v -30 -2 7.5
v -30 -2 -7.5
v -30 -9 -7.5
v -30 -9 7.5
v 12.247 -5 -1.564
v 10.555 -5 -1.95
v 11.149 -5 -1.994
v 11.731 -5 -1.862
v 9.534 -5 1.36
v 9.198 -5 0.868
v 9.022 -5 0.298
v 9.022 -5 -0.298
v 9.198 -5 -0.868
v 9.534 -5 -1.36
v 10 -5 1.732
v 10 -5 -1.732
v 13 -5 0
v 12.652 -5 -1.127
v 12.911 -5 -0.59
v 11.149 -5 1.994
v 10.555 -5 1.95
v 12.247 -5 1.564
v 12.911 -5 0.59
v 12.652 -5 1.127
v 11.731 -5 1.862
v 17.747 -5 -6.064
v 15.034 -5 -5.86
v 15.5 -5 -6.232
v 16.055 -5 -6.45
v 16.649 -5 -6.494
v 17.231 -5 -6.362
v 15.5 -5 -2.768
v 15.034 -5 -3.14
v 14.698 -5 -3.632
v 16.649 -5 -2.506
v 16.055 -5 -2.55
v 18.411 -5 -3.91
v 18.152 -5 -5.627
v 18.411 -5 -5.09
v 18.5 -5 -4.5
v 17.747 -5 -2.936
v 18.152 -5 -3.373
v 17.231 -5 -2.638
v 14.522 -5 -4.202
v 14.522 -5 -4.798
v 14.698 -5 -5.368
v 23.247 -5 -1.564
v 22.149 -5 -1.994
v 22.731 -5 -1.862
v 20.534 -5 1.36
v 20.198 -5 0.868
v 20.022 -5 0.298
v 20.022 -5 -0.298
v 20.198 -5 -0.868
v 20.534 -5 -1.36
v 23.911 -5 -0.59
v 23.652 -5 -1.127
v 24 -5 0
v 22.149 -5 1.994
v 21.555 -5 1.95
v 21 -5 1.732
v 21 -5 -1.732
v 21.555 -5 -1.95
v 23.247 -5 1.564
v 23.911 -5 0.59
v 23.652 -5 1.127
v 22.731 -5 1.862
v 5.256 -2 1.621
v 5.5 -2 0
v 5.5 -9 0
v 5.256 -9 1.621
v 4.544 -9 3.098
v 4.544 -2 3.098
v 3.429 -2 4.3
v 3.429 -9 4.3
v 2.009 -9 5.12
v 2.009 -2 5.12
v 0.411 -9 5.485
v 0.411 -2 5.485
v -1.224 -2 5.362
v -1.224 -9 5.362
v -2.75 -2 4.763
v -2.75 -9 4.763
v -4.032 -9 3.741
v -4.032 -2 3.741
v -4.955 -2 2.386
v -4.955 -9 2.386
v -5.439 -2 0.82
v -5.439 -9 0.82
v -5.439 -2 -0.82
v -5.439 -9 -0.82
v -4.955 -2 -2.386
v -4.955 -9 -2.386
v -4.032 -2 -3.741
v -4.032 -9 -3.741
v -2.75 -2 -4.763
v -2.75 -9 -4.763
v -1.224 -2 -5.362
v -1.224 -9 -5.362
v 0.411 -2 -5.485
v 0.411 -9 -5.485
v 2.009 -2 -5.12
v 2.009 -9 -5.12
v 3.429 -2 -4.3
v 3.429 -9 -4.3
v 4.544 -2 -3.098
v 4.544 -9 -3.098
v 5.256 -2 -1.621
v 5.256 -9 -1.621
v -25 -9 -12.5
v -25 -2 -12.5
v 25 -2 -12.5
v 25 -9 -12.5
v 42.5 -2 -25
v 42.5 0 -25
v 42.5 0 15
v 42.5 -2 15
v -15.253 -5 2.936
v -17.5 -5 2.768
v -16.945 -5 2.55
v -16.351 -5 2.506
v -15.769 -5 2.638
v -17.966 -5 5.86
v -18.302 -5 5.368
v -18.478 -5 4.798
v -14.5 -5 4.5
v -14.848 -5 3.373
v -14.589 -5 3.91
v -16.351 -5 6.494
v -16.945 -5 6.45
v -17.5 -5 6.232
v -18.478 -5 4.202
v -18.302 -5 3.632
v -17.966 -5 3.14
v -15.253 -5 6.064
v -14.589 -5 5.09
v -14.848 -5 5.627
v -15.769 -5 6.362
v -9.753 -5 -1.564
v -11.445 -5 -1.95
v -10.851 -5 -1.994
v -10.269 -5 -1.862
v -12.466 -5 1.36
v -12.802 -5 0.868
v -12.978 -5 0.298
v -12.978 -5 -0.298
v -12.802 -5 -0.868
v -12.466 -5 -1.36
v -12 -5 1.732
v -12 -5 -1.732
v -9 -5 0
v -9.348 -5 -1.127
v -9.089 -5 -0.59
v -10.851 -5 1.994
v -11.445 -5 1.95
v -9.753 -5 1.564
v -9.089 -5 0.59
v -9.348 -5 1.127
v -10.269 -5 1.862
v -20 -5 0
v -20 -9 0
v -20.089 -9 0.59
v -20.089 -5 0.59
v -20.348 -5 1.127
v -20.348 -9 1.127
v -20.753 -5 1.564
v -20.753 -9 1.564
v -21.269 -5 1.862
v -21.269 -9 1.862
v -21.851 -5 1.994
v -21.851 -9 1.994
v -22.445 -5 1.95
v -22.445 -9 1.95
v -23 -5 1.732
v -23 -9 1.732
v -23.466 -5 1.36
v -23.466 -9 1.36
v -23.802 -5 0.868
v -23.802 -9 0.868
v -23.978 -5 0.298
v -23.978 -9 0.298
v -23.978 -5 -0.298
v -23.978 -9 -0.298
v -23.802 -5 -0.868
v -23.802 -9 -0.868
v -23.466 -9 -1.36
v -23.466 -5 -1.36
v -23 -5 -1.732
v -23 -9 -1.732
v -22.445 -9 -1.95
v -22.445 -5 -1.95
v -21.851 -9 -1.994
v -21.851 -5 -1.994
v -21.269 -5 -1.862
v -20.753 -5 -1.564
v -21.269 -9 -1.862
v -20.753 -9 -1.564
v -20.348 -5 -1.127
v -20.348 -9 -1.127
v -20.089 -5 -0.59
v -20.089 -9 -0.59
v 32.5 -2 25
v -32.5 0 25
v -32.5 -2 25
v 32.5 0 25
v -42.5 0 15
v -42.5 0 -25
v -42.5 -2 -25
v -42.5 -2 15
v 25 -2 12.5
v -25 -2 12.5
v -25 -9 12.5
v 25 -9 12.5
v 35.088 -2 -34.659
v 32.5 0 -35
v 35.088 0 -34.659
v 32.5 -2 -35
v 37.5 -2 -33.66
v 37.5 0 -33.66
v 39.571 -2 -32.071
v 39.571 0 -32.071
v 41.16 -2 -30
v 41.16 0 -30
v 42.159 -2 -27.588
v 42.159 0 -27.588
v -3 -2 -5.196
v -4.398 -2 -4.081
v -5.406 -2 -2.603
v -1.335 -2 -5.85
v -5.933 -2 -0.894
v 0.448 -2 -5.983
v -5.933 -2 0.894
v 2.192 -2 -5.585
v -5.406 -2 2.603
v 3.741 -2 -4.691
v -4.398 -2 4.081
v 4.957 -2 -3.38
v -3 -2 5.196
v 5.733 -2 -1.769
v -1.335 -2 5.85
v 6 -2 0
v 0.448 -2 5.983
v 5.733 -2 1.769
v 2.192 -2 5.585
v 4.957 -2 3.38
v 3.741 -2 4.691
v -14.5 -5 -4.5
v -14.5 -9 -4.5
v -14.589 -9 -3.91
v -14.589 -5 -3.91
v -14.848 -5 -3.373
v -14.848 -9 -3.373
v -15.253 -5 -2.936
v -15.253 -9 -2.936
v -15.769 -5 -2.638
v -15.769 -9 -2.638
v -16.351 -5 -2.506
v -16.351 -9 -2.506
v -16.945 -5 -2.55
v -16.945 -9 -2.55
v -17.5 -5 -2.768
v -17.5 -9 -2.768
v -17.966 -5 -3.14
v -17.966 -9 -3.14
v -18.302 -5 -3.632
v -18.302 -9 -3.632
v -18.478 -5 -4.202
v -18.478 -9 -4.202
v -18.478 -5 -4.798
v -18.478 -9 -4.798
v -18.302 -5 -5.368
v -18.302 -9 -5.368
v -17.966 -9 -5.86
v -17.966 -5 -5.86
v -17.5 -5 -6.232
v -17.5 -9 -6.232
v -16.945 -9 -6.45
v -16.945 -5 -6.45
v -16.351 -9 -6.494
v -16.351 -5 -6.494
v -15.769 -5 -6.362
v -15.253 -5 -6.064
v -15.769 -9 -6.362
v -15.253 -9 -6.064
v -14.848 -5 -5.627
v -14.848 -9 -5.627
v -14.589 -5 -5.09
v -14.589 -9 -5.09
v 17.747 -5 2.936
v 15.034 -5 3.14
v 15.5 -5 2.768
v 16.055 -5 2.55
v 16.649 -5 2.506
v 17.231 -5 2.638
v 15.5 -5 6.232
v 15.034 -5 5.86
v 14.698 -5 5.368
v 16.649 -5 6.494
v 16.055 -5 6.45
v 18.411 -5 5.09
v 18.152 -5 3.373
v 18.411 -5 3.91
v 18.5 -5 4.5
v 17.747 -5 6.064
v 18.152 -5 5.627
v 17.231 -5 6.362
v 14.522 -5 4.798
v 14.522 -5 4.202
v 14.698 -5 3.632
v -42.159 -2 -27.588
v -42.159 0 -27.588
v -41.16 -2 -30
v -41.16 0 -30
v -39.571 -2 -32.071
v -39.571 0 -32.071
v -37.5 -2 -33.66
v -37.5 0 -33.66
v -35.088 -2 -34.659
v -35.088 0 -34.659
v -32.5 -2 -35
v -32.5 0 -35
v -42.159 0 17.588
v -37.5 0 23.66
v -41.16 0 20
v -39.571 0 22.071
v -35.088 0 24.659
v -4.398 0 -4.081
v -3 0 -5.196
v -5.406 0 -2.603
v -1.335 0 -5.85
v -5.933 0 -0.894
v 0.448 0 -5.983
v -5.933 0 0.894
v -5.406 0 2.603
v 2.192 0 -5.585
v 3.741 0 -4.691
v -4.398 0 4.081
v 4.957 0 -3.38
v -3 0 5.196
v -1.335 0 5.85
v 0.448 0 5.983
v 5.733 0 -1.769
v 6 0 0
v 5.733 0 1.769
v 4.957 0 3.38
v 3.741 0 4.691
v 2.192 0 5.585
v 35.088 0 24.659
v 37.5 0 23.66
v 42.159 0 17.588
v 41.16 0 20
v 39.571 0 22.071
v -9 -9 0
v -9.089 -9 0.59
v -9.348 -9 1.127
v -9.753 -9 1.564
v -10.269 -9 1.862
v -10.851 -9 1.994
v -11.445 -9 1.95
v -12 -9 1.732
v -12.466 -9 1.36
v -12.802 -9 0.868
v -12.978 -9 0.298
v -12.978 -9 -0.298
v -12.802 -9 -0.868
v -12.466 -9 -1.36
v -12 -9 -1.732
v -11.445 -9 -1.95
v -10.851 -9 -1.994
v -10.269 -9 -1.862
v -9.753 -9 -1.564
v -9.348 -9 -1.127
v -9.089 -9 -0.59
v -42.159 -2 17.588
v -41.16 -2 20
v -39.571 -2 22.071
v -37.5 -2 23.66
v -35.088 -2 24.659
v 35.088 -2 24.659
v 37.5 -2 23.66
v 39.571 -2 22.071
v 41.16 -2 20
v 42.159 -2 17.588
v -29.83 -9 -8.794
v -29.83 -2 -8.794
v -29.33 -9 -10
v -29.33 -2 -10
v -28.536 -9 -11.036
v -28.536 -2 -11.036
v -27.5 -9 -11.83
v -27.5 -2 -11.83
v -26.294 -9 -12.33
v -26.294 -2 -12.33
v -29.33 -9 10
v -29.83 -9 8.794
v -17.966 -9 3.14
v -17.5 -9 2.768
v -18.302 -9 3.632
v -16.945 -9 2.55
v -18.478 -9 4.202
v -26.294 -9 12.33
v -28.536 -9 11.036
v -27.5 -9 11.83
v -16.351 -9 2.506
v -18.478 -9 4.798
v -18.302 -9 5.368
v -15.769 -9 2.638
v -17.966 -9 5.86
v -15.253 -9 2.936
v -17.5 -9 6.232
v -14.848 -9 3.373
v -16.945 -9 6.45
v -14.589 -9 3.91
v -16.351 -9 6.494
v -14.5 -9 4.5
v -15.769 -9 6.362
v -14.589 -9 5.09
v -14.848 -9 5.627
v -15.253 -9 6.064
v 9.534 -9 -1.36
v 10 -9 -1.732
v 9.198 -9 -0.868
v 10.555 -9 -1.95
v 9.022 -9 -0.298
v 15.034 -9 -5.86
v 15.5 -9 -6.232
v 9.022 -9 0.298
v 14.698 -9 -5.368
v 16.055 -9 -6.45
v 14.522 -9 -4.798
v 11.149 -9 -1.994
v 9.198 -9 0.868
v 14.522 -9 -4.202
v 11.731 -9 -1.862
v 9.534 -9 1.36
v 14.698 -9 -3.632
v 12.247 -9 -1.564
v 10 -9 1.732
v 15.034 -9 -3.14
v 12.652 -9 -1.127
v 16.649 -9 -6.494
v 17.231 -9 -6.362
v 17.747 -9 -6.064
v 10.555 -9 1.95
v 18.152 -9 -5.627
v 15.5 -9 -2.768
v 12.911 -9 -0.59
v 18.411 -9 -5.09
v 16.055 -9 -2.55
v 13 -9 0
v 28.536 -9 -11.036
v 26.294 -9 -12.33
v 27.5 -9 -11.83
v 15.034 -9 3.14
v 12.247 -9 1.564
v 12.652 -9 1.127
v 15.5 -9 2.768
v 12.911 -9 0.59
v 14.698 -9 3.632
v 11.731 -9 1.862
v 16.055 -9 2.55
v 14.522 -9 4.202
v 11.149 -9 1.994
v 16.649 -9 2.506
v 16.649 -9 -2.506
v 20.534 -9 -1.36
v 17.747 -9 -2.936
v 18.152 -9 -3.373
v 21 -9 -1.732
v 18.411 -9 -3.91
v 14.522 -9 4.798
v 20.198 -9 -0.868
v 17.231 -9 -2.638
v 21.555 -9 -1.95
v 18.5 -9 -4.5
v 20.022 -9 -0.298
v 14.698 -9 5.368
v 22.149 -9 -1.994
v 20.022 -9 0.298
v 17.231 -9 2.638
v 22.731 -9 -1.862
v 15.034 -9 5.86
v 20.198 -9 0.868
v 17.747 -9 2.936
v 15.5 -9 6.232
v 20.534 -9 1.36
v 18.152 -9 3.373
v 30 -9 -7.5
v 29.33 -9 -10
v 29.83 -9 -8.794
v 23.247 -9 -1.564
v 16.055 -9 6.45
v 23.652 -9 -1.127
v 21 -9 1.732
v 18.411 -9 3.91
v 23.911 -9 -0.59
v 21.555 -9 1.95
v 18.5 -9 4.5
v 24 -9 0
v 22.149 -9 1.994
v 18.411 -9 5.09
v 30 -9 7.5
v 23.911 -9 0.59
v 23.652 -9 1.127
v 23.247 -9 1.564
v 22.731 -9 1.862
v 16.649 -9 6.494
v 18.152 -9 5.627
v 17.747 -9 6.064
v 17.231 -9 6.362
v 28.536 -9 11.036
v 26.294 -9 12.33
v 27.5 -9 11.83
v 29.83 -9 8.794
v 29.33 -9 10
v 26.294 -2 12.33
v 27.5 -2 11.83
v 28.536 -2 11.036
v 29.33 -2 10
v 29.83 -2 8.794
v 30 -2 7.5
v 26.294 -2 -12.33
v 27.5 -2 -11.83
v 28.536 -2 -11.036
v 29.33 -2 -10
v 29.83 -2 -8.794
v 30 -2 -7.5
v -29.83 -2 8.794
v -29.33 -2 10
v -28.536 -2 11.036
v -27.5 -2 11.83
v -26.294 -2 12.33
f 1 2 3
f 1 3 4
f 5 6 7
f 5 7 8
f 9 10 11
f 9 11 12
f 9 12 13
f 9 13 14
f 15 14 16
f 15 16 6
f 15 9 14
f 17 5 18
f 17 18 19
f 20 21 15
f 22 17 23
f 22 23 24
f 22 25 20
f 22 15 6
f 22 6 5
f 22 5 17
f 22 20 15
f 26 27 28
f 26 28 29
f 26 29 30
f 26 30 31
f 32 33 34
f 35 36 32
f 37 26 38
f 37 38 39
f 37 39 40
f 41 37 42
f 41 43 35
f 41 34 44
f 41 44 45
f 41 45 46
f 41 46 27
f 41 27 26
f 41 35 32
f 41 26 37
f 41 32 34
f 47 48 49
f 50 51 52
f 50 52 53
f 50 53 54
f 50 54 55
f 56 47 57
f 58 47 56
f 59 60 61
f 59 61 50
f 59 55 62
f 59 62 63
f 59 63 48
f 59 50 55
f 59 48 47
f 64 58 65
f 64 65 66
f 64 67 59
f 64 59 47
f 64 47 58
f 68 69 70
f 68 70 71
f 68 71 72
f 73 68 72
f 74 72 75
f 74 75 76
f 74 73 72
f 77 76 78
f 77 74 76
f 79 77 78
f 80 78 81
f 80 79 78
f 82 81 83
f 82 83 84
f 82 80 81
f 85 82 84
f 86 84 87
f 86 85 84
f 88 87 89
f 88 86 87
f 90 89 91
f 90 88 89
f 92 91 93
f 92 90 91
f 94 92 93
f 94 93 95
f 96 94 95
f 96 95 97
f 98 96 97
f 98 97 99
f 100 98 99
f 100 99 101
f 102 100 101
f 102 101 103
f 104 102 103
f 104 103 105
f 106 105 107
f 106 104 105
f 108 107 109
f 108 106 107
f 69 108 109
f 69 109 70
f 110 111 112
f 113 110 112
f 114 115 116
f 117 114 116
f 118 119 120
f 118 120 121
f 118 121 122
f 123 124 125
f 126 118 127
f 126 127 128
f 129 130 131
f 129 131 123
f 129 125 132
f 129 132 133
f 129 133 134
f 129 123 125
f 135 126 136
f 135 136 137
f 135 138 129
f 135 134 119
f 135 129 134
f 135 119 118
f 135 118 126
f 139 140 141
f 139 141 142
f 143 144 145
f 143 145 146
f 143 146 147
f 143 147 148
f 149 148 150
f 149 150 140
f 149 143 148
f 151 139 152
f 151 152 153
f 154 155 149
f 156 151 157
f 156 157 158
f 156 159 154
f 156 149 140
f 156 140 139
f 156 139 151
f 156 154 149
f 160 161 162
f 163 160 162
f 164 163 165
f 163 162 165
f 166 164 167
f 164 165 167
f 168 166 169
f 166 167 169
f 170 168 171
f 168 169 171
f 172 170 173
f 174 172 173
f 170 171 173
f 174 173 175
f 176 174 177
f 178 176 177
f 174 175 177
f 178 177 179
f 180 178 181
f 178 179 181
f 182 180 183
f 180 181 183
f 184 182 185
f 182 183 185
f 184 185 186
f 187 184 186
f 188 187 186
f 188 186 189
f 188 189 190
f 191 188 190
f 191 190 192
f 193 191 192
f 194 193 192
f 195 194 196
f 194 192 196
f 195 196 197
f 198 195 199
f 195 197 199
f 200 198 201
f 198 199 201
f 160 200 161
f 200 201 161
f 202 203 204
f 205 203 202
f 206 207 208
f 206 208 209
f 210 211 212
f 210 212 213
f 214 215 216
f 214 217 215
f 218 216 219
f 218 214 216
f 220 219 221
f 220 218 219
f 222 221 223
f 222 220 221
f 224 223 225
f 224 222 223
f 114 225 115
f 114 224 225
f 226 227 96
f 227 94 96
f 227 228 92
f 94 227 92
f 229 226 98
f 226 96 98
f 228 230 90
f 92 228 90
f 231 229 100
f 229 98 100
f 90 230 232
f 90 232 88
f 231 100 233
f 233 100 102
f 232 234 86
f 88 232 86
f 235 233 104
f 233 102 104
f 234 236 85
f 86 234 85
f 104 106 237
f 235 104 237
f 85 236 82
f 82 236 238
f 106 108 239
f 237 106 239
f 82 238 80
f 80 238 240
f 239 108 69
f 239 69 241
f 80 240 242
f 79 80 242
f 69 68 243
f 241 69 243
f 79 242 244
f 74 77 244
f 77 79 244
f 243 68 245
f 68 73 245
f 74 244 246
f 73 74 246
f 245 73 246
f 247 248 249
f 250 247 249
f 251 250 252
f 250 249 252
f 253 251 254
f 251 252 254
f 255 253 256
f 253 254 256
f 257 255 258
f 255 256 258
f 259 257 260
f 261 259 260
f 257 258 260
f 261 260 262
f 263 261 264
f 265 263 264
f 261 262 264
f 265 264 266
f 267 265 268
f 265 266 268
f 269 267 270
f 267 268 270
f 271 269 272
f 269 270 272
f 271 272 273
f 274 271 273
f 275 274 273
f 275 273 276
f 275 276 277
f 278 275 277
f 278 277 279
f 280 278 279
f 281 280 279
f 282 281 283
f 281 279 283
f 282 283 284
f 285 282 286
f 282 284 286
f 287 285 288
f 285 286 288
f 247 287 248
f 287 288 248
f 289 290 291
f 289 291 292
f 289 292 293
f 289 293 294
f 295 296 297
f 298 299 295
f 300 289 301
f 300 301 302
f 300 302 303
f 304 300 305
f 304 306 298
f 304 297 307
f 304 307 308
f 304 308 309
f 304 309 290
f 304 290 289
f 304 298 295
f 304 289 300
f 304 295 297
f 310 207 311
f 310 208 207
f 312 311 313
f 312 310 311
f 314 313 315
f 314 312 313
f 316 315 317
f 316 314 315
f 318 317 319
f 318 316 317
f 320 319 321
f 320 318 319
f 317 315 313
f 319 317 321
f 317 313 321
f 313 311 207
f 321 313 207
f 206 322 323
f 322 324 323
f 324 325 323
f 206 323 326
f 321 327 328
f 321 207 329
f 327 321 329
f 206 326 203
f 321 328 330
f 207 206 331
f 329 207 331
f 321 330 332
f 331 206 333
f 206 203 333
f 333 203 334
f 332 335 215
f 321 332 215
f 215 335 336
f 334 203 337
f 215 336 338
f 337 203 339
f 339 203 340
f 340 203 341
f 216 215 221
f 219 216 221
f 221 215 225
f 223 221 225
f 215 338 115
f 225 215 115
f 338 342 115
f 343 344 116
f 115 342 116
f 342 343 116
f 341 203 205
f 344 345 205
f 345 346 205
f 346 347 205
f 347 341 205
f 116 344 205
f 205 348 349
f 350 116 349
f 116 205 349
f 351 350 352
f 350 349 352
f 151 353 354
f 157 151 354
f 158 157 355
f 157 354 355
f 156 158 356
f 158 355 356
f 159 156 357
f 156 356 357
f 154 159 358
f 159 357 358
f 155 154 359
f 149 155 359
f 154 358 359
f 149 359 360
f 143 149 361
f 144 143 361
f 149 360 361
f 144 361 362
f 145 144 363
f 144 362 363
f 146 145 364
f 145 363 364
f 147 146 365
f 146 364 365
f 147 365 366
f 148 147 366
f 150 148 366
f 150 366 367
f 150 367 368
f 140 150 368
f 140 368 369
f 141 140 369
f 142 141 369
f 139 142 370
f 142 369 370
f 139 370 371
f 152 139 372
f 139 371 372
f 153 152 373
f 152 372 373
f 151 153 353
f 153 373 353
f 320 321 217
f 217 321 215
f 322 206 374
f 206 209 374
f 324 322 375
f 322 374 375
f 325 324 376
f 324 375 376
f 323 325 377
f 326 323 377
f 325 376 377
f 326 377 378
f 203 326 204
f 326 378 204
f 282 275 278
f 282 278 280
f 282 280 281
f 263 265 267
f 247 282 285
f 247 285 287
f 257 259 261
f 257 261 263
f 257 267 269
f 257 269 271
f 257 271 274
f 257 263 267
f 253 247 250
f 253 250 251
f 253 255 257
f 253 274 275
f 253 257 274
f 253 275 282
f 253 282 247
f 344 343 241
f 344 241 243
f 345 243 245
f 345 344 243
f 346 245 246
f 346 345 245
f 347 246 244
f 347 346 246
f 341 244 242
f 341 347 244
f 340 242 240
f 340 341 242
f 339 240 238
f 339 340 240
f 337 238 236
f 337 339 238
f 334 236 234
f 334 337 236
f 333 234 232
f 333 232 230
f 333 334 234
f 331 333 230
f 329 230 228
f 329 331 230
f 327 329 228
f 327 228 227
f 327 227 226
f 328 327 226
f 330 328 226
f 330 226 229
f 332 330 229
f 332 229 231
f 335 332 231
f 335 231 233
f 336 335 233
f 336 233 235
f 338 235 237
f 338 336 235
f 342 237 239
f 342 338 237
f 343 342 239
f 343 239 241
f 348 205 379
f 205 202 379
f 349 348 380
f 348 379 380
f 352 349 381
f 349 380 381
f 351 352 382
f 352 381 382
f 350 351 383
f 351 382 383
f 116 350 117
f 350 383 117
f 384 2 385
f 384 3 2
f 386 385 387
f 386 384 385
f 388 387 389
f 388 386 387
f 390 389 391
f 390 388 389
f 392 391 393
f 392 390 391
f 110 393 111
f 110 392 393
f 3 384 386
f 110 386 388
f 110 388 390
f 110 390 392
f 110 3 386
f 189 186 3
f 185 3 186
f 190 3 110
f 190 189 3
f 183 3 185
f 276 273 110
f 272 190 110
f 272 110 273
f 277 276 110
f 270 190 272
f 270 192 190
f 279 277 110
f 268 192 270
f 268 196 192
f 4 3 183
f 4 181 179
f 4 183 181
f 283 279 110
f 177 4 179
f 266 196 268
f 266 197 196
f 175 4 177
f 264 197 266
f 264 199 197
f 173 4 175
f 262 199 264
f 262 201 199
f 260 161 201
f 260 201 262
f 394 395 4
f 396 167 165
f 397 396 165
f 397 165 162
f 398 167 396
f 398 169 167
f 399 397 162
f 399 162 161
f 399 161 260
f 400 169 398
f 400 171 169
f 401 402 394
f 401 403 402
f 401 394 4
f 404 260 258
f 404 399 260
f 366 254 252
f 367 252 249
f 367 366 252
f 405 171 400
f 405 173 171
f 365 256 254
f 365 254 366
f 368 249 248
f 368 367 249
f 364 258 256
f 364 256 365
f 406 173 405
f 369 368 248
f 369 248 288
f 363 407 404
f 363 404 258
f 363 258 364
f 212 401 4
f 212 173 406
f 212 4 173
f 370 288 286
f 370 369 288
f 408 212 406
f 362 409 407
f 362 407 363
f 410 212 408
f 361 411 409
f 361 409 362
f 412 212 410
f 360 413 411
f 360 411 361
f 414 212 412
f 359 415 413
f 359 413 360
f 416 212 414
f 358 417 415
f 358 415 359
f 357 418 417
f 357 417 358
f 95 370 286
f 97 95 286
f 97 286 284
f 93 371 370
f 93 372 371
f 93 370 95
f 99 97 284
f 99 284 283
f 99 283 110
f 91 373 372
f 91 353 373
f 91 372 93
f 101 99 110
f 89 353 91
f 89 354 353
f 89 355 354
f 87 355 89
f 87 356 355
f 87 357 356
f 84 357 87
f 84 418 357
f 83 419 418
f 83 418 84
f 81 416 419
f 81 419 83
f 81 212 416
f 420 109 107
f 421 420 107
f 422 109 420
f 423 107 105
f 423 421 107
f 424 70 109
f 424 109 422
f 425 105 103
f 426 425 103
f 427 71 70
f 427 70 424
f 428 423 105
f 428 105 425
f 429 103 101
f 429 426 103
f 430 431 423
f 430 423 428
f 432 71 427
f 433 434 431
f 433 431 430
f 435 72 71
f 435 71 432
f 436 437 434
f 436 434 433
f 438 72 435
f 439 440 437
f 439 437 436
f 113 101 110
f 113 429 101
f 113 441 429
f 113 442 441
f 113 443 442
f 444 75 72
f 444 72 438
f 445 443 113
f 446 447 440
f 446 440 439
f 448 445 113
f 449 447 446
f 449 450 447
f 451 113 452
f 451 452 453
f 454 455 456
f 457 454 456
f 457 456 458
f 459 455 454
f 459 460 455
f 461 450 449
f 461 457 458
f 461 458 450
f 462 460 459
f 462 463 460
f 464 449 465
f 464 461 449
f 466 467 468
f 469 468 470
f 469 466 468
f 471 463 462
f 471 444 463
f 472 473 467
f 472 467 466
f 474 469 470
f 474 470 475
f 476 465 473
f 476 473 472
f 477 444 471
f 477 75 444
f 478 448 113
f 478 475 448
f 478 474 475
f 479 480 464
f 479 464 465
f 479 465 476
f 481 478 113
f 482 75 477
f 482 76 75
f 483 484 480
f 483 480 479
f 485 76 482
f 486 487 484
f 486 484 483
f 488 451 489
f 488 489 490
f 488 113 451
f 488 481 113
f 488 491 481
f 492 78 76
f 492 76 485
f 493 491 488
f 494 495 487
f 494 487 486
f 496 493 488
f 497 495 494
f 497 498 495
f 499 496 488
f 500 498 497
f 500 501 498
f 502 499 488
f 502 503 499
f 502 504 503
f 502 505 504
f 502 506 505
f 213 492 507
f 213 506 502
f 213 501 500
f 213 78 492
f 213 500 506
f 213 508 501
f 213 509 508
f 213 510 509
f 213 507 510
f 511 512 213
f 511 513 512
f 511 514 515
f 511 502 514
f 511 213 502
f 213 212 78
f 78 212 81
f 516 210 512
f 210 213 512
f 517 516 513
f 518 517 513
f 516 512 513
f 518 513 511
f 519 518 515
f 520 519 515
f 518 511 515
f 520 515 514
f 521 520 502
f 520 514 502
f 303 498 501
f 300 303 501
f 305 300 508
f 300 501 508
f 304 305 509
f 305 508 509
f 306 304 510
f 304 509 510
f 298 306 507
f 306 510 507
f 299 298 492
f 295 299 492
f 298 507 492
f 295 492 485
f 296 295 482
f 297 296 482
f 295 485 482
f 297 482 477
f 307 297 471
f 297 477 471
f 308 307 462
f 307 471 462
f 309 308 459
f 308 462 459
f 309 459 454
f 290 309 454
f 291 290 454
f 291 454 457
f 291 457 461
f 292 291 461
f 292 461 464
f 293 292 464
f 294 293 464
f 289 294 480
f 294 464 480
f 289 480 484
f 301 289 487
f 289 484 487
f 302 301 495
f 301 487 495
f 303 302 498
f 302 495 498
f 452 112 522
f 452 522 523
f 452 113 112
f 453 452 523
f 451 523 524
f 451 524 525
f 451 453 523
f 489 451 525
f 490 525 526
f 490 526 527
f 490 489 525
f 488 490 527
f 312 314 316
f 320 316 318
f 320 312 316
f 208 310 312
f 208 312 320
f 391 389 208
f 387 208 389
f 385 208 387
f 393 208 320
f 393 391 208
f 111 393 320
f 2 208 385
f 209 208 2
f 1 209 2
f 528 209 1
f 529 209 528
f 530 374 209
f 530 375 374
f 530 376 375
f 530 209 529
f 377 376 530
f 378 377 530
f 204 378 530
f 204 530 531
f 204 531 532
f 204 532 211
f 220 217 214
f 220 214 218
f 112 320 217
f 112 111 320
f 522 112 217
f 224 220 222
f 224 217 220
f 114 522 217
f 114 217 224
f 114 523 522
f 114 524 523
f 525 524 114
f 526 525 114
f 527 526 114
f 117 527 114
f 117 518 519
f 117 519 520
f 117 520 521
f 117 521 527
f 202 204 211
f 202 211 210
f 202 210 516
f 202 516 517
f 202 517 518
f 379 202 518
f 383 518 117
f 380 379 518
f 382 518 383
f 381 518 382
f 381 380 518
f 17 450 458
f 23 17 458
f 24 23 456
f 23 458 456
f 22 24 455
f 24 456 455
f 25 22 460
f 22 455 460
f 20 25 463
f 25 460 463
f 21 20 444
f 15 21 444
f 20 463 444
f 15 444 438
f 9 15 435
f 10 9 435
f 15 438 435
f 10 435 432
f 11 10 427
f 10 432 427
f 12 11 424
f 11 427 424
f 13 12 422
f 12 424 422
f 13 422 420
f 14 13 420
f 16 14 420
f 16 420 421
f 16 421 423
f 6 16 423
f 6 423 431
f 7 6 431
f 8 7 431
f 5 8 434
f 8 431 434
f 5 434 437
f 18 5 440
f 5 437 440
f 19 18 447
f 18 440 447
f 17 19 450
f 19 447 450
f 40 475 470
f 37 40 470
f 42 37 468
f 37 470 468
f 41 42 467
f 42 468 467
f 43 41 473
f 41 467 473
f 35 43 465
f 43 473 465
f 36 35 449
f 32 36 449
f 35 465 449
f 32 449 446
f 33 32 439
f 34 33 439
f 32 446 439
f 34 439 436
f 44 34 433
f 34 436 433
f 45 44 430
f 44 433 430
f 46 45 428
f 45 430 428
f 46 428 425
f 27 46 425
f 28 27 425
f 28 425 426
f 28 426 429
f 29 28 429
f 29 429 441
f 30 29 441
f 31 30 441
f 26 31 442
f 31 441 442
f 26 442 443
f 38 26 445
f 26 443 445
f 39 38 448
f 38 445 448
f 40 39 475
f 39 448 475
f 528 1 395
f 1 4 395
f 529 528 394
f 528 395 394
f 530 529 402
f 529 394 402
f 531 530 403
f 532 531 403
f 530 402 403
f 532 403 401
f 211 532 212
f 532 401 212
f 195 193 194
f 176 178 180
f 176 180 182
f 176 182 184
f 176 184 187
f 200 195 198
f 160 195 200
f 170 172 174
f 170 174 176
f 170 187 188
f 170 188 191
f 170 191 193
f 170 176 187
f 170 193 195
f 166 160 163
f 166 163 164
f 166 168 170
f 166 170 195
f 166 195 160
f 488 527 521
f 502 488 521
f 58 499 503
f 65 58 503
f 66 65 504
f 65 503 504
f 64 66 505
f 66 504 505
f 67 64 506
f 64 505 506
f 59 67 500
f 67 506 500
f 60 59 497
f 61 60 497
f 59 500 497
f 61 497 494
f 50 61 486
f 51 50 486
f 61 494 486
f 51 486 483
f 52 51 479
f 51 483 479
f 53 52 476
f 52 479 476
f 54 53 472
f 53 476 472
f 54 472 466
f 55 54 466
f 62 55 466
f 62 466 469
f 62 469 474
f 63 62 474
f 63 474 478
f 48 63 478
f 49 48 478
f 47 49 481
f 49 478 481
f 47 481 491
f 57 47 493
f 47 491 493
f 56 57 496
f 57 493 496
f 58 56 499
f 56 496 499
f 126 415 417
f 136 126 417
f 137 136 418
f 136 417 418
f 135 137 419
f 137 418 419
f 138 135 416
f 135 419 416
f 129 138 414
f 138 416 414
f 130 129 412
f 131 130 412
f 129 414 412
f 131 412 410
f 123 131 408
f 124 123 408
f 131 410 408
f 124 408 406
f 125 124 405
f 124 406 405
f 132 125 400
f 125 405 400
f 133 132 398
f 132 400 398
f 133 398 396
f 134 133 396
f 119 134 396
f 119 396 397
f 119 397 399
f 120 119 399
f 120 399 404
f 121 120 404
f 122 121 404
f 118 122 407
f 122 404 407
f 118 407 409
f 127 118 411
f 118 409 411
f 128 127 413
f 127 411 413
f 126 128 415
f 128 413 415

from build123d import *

# Parameters (mm, degrees)
F0_W     = 85
F0_H     = 60
F0_R     = 6
F1_DEPTH = 2
F2_W     = 60
F2_H     = 25
F2_R     = 5.5
F3_DEPTH = 7
F4_R     = 5
F5_R     = 10
F6_R     = 2
F7_DEPTH = 4


with BuildPart() as f1:
    # F0 (on Front) → F1 (new body)
    with BuildSketch(Plane.XZ):
        with Locations((0, -5)):
            Rectangle(F0_W, F0_H)
        Circle(F0_R, mode=Mode.SUBTRACT)
    extrude(amount=F1_DEPTH)

    # F2 (on face) → F3 (join)
    with BuildSketch(Plane.XZ.offset(2)):
        Rectangle(F2_W, F2_H)
        Circle(F2_R, mode=Mode.SUBTRACT)
    extrude(amount=F3_DEPTH)

    # F4
    f4_edges = [f1.edges().sort_by_distance(p)[0] for p in [
        (30, -5.5, 12.5),
        (30, -5.5, -12.5),
        (-30, -5.5, -12.5),
        (-30, -5.5, 12.5),
    ]]
    fillet(f4_edges, radius=F4_R)

    # F5
    f5_edges = [f1.edges().sort_by_distance(p)[0] for p in [
        (42.5, -1, 25),
        (42.5, -1, -35),
        (-42.5, -1, -35),
        (-42.5, -1, 25),
    ]]
    fillet(f5_edges, radius=F5_R)

    # F6 (on face) → F7 (cut)
    with BuildSketch(Plane.XZ.offset(9)):
        with Locations((-11, 0)):
            Circle(F6_R)
        with Locations((-22, 0)):
            Circle(F6_R)
        with Locations((11, 0)):
            Circle(F6_R)
        with Locations((22, 0)):
            Circle(F6_R)
        with Locations((-16.5, -4.5)):
            Circle(F6_R)
        with Locations((16.5, -4.5)):
            Circle(F6_R)
        with Locations((16.5, 4.5)):
            Circle(F6_R)
        with Locations((-16.5, 4.5)):
            Circle(F6_R)
    extrude(amount=-F7_DEPTH, mode=Mode.SUBTRACT)


solid = f1.part
